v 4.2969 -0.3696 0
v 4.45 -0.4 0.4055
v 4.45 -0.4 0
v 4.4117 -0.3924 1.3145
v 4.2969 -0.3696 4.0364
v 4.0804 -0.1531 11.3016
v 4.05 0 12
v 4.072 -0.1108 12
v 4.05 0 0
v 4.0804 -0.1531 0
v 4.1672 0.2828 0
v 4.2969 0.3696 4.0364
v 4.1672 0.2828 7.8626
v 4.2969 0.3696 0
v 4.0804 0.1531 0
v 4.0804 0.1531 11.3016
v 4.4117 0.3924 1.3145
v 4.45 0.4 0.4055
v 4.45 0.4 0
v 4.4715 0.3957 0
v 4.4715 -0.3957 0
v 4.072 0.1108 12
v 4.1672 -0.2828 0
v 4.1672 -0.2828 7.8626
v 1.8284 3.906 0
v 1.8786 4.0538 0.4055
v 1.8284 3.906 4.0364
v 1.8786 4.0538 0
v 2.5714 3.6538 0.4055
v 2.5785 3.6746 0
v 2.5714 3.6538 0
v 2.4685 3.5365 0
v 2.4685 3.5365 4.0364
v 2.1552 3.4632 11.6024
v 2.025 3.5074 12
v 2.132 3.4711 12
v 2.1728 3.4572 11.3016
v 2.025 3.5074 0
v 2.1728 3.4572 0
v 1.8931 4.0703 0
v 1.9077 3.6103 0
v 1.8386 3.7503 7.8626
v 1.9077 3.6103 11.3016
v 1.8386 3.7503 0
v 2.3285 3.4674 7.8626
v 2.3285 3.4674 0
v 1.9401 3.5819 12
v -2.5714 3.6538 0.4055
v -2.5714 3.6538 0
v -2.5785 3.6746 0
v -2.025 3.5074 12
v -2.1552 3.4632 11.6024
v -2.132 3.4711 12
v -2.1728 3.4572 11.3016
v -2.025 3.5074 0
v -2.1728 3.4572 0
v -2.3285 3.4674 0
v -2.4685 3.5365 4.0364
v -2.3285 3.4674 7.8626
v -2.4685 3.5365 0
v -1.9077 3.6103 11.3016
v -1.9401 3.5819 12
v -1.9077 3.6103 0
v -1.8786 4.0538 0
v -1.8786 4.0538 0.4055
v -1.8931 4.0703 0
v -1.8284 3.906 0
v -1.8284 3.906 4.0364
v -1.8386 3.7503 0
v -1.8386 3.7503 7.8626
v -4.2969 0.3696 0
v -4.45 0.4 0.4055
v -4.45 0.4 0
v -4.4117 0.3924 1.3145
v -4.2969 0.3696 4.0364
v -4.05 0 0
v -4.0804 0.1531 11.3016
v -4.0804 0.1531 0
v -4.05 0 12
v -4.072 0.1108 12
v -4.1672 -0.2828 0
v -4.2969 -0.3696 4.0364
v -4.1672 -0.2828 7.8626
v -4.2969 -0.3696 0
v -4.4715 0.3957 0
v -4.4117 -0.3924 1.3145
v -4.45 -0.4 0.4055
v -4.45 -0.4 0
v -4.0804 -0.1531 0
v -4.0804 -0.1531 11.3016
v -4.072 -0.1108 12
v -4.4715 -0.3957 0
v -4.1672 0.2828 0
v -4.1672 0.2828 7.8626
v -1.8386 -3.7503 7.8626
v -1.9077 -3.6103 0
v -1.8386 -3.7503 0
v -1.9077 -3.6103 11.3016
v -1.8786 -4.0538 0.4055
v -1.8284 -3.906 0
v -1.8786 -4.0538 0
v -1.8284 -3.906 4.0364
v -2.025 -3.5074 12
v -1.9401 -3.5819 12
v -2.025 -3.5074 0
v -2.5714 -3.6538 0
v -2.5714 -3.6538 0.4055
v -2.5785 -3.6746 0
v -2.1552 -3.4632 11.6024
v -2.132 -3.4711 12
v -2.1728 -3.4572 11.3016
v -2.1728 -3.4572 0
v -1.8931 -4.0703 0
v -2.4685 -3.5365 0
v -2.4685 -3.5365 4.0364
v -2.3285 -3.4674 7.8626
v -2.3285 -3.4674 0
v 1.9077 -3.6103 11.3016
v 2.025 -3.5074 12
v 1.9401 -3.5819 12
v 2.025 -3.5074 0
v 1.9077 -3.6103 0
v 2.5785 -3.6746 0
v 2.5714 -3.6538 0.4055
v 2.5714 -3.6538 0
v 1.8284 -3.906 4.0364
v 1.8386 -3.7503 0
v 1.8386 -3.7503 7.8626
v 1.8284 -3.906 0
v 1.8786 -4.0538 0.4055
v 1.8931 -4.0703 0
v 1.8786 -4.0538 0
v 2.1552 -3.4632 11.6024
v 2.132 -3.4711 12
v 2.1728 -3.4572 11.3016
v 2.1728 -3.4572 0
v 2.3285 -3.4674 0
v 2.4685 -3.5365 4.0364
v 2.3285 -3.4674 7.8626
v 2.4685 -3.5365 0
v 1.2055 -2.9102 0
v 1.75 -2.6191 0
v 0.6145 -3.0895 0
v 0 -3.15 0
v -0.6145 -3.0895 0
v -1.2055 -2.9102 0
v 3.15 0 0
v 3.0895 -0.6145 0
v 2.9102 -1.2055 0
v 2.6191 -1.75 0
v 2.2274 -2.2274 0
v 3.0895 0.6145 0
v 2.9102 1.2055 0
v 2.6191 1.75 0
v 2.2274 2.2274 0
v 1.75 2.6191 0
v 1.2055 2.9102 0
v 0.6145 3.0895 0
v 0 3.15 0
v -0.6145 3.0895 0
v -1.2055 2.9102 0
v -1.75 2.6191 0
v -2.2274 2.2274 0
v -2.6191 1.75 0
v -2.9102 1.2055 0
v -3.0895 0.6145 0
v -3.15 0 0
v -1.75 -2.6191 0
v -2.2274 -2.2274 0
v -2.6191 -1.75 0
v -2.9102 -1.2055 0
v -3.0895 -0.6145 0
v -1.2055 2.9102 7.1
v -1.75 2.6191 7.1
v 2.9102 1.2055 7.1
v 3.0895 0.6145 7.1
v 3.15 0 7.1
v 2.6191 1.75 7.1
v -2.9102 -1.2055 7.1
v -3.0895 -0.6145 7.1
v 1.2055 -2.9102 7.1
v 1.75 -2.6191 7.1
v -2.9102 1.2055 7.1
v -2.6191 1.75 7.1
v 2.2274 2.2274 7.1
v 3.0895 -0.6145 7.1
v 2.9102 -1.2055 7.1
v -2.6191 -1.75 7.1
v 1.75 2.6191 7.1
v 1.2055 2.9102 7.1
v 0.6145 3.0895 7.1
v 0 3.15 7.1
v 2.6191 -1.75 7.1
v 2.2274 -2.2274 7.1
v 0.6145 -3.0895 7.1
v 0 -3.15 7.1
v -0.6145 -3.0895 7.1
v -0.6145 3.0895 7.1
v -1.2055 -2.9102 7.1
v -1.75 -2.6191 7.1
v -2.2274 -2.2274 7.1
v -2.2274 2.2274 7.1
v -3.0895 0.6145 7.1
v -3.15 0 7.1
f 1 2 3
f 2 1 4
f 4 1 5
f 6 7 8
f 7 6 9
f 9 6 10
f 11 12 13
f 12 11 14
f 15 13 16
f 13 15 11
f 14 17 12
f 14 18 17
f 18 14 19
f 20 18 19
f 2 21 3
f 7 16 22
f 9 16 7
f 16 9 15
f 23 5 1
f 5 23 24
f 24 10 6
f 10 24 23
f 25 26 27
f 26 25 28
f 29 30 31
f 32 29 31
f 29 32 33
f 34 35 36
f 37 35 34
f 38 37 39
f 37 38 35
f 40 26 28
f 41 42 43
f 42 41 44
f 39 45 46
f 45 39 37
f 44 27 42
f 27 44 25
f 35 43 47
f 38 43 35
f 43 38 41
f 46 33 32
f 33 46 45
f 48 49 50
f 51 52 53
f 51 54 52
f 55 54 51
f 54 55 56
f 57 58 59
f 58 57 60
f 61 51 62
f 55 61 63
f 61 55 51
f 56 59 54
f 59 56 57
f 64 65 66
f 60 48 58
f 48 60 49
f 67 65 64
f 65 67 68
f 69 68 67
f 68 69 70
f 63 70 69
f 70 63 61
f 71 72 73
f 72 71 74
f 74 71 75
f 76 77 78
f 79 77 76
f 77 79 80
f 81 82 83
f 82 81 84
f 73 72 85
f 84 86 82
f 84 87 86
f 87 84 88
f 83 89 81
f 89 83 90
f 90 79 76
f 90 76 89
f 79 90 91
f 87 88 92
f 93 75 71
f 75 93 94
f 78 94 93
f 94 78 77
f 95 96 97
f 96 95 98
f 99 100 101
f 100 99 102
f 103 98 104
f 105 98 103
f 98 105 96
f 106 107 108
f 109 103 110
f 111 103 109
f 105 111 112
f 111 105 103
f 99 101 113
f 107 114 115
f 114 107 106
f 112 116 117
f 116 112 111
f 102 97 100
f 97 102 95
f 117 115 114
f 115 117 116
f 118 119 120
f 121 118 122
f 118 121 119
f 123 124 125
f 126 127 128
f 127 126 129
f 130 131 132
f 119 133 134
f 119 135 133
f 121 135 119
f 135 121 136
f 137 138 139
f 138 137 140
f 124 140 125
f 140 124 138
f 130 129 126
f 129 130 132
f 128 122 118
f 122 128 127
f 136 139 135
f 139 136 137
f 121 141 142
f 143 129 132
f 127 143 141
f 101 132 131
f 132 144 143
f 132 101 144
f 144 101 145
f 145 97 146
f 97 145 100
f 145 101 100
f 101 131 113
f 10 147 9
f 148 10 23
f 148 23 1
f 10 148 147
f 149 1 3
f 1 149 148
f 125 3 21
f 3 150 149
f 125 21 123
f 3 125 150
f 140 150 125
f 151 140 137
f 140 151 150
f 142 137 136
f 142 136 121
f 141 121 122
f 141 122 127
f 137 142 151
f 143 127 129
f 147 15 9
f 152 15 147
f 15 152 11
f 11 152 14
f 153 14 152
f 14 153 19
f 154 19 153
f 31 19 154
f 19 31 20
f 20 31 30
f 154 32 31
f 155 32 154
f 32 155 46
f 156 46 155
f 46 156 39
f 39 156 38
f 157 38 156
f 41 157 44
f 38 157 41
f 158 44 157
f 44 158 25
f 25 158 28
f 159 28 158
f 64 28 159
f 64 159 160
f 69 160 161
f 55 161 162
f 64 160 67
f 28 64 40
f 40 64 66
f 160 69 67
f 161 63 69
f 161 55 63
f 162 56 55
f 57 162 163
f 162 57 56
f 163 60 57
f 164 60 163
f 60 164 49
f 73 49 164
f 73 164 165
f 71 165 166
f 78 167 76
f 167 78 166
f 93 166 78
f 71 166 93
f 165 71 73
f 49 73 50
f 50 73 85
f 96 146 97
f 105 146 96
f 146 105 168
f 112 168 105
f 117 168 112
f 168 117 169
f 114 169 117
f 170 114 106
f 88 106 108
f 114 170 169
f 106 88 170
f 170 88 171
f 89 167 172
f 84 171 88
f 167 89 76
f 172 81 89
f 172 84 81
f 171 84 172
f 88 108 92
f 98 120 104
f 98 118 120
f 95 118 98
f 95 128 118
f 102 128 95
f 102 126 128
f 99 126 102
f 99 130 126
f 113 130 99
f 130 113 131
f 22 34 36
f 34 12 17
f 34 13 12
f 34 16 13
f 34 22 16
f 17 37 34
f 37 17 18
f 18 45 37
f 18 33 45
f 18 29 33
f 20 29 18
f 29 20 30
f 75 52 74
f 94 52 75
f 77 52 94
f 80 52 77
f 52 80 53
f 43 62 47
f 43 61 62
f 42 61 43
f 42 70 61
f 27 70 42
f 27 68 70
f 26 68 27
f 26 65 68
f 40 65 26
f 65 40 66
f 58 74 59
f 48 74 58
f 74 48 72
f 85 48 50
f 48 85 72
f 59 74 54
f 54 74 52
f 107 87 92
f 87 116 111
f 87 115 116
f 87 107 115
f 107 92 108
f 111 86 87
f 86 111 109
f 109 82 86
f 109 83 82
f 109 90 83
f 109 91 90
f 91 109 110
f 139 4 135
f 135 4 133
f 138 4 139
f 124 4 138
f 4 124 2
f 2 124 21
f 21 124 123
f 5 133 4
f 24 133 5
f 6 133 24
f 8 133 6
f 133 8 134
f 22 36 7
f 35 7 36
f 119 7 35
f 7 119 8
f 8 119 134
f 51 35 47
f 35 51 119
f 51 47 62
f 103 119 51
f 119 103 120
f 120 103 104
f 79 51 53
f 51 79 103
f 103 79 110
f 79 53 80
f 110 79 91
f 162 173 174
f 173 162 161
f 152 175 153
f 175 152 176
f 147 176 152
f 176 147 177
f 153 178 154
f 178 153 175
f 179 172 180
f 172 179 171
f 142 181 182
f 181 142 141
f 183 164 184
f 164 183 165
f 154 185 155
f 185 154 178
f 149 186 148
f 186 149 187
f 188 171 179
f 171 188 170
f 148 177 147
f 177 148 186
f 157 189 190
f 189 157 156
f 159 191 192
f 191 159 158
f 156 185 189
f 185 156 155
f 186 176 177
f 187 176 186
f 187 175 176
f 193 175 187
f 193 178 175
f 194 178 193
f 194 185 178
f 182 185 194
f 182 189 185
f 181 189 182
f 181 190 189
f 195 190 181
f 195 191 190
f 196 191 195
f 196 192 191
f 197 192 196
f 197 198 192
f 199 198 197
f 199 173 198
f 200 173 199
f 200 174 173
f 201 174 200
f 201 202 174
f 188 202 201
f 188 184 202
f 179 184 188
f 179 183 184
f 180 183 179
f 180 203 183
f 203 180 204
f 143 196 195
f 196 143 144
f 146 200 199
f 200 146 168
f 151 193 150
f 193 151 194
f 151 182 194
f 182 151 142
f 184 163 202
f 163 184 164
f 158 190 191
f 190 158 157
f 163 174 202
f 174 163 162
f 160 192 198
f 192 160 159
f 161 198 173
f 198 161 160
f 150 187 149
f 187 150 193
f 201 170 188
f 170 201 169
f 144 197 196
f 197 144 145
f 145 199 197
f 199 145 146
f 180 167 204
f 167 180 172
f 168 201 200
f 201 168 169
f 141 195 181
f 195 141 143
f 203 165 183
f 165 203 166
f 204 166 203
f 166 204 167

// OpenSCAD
// ACCESS KNOB — Intellijel Eurorack Micro Knob
// Generated via CLI for Studio Knobs
module access_knob_intellijel_micro() {
  outer_d = 9.4;
  height = 12;
  taper = 0.88;
  bore_d = 6;
  slot_h = 7;
  tex_depth = 0.5;
  tex_scale = 0.8;
  tex_count = 6;

  difference() {
    cylinder(h=height, d1=outer_d, d2=outer_d*taper, $fn=6);
    translate([0,0,-0.1]) cylinder(h=slot_h+0.2, d=bore_d + 0.3, $fn=32);
    for(i=[0:tex_count-1]) {
      rotate([0,0,i*(360/tex_count)])
        translate([outer_d/2-tex_depth/2, 0, height/2])
          cylinder(h=height*1.1, d=tex_scale, center=true, $fn=16);
    }
  }
}
access_knob_intellijel_micro();
